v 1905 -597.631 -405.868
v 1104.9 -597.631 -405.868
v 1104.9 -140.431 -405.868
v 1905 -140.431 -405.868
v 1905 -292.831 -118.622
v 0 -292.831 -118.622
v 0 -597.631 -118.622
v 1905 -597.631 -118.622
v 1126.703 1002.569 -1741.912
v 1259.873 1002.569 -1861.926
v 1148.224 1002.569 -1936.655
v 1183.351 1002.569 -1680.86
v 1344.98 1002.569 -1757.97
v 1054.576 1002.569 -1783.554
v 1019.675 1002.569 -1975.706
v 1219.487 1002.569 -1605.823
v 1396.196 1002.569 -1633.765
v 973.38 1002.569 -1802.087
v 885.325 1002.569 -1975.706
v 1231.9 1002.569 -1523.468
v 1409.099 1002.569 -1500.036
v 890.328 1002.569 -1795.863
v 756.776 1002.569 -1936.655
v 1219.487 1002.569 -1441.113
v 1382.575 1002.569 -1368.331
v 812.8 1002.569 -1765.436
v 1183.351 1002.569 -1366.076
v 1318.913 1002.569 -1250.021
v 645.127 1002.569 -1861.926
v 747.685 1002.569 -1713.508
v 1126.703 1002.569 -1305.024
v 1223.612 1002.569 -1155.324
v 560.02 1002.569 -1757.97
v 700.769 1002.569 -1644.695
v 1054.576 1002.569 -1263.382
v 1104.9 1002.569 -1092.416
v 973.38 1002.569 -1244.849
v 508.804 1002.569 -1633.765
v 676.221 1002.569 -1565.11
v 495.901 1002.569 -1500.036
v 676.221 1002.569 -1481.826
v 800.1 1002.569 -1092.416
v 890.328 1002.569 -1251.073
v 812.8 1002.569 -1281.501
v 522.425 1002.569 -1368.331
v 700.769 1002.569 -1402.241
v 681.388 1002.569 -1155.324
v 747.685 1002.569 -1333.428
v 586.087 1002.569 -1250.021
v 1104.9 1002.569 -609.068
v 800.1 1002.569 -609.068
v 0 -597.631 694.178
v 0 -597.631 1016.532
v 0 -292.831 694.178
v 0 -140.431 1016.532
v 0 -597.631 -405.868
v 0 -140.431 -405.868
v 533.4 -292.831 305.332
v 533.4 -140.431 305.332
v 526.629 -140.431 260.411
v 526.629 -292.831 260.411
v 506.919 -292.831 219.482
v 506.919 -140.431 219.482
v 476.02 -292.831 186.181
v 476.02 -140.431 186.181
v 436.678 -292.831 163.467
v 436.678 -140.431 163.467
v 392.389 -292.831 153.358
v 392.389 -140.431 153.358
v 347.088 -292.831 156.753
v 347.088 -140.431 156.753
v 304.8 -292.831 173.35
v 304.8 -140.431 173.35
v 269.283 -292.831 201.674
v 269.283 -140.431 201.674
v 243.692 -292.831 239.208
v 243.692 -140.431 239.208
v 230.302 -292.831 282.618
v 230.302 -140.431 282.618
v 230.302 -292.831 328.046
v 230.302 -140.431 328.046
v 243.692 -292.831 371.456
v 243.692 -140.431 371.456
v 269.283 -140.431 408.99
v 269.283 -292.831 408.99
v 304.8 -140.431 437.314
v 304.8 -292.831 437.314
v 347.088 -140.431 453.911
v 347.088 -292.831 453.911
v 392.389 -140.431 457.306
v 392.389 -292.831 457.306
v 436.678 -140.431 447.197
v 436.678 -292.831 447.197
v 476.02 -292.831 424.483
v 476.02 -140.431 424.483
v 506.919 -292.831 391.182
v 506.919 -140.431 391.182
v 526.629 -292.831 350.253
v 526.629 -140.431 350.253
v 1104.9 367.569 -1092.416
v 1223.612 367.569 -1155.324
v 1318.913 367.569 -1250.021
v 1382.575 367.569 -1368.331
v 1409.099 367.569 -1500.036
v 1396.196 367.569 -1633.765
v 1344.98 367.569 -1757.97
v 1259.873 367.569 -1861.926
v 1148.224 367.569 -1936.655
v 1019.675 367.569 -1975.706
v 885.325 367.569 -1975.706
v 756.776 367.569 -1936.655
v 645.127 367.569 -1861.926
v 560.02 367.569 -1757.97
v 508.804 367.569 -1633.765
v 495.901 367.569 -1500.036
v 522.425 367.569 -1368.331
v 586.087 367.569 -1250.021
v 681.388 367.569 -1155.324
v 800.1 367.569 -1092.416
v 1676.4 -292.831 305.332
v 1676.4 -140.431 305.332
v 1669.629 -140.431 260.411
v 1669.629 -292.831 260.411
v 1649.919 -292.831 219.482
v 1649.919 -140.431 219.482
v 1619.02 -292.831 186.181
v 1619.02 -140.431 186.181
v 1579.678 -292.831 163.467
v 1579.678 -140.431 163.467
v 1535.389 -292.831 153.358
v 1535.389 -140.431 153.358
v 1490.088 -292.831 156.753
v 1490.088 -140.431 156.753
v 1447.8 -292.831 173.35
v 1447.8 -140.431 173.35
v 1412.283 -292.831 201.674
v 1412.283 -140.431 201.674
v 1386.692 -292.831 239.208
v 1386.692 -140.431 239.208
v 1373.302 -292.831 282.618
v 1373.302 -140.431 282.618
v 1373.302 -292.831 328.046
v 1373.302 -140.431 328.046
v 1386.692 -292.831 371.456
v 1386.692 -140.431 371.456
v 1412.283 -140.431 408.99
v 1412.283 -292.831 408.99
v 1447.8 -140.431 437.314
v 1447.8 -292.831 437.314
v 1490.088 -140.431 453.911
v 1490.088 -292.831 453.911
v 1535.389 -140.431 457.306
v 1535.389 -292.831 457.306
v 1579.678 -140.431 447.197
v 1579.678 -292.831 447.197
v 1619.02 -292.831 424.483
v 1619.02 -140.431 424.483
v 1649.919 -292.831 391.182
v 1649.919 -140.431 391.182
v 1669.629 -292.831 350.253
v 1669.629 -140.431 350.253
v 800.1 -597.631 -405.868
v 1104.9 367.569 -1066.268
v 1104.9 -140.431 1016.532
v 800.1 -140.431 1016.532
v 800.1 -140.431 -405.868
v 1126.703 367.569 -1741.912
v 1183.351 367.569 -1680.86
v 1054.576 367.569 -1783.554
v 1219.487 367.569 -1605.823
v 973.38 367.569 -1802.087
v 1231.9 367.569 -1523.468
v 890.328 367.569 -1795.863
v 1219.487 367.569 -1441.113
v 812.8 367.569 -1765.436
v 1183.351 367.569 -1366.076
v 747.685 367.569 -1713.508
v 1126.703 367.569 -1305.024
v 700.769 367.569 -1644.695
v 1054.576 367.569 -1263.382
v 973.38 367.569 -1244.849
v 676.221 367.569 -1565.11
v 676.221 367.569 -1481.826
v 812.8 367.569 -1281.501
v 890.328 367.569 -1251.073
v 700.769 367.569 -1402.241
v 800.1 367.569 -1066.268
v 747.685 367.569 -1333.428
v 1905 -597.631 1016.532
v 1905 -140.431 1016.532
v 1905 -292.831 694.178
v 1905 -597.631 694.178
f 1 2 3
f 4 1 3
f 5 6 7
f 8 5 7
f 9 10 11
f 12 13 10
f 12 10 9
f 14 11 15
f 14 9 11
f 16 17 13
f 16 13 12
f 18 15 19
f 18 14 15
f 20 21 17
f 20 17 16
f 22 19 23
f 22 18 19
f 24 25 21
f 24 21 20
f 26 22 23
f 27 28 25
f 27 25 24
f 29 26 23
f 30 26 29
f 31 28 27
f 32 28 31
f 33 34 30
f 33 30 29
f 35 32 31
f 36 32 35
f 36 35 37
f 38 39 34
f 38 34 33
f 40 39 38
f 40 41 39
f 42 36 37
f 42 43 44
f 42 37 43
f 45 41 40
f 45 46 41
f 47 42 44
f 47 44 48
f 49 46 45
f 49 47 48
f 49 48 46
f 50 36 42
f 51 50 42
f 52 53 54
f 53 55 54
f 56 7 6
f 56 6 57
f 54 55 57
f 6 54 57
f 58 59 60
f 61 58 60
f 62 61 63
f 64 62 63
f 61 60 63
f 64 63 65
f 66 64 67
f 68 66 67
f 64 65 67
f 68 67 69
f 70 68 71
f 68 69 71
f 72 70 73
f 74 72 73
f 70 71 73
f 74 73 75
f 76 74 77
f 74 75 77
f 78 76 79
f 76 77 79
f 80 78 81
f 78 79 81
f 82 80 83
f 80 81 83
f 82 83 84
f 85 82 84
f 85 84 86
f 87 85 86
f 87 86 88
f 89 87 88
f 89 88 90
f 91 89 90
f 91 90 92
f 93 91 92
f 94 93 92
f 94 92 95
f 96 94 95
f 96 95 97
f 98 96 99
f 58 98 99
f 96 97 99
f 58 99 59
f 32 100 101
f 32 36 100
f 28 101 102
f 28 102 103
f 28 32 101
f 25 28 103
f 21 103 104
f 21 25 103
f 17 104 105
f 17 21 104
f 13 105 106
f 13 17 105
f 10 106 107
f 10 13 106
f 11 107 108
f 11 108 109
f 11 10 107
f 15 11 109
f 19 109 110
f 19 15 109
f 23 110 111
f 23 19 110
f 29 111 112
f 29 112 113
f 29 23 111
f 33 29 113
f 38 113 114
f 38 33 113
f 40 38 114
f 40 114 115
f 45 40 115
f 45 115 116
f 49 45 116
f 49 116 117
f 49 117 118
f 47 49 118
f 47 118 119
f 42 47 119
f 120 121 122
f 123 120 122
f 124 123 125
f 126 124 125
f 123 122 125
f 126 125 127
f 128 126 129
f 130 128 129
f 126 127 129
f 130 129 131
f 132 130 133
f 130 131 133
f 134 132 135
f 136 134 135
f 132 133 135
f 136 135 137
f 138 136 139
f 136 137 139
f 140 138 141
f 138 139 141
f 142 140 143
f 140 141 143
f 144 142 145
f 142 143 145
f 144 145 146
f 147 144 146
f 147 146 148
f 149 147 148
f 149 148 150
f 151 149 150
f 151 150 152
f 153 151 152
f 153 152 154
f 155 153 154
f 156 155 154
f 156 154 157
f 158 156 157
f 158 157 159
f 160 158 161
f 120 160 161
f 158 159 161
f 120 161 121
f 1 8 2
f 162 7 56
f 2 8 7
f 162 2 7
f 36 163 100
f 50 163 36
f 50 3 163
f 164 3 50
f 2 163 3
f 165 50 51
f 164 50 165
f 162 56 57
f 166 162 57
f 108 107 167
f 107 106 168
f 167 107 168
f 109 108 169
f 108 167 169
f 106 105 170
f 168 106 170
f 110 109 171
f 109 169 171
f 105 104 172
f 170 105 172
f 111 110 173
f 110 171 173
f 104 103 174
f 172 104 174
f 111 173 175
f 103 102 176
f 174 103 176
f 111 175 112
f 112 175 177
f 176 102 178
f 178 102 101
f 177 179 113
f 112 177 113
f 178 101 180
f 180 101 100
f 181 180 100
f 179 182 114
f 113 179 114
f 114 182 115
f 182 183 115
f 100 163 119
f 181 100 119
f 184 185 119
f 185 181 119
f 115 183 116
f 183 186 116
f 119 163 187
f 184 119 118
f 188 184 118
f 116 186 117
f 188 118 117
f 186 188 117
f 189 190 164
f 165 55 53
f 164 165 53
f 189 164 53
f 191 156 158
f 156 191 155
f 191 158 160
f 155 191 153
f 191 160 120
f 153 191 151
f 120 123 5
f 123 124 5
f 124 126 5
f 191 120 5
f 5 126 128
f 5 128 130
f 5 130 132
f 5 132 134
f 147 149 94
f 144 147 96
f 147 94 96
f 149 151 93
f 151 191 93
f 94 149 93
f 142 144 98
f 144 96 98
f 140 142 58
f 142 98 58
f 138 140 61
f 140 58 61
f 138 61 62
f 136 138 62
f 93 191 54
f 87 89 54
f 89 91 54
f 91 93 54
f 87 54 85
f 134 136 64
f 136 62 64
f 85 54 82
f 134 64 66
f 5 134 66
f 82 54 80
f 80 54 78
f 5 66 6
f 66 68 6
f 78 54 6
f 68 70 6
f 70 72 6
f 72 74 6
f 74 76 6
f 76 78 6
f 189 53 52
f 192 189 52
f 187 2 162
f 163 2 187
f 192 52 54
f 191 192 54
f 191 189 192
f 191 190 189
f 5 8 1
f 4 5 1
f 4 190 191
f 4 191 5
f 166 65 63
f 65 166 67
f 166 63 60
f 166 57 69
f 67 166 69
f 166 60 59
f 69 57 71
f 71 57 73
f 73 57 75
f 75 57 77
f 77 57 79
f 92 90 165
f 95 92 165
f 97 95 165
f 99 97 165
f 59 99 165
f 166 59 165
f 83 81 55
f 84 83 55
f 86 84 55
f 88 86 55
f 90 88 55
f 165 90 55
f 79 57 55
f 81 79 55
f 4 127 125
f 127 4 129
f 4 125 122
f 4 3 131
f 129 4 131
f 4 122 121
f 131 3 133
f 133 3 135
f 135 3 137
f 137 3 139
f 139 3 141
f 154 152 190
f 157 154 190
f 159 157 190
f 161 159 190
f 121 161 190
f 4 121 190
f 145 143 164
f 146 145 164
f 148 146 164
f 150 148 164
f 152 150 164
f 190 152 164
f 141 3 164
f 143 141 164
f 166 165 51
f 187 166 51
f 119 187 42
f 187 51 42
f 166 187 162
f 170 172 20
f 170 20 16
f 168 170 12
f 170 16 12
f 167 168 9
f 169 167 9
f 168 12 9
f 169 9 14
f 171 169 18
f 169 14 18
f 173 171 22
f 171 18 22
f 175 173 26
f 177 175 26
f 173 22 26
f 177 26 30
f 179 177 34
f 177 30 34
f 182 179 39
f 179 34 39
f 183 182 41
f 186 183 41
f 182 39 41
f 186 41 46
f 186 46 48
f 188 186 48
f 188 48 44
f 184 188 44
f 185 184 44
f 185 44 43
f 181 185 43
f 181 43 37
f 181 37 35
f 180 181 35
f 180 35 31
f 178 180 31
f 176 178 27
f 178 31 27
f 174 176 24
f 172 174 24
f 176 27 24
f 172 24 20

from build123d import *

# Parameters (mm, degrees)
BOSS_EXTRUDE1_DEPTH      = 1905
SKETCH6_R                = 457.2
SKETCH6_R_2              = 279.4
BOSS_EXTRUDE2_DEPTH      = 635
BOSS_EXTRUDE3_DEPTH      = 152.4
BOSS_EXTRUDE3_DEPTH_BACK = 152.4
SKETCH11_R               = 152.4
CUT_EXTRUDE1_DEPTH       = 152.4
SKETCH12_W               = 304.8
SKETCH12_H               = 635
BOSS_EXTRUDE6_DEPTH      = 152.4


with BuildPart() as part:
    # Sketch1 → Boss-Extrude1 (new body)
    with BuildSketch(Plane(origin=(0, 0, 0), x_dir=(0, 0, -1), z_dir=(1, 0, 0))):
        Polygon((-1016.531937173, -597.631413613), (-694.178010471, -597.631413613), (-694.178010471, -292.831413613), (118.621989529, -292.831413613), (118.621989529, -597.631413613), (405.868062827, -597.631413613), (405.868062827, -140.431413613), (-1016.531937173, -140.431413613), align=None)
    extrude(amount=BOSS_EXTRUDE1_DEPTH)

    # Sketch10 → Boss-Extrude3 (add, two sides)
    with BuildSketch(Plane(origin=(952.5, 0, 0), x_dir=(0, 0, -1), z_dir=(1, 0, 0))) as boss_extrude3_sk:
        Polygon((609.068062827, 1002.568586387), (-1016.531937173, -140.431413613), (405.868062827, -140.431413613), (405.868062827, -597.631413613), (1066.268062827, 367.568586387), (1066.268062827, 1002.568586387), align=None)
    extrude(amount=BOSS_EXTRUDE3_DEPTH)
    extrude(boss_extrude3_sk.sketch, amount=-BOSS_EXTRUDE3_DEPTH_BACK)

    # Sketch11 → Cut-Extrude1 (cut)
    with BuildSketch(Plane(origin=(0, -140.431413613, 0), x_dir=(1, 0, 0), z_dir=(0, 1, 0))):
        with Locations((1524, -305.331937173)):
            Circle(SKETCH11_R)
        with Locations((381, -305.331937173)):
            Circle(SKETCH11_R)
    extrude(amount=-CUT_EXTRUDE1_DEPTH, mode=Mode.SUBTRACT)



with BuildPart() as body_2:
    # Sketch6 → Boss-Extrude2 (new body)
    with BuildSketch(Plane(origin=(0, 1002.568586387, 0), x_dir=(1, 0, 0), z_dir=(0, 1, 0))):
        with Locations((952.5, 1523.468062827)):
            Circle(SKETCH6_R)
        with Locations((952.5, 1523.468062827)):
            Circle(SKETCH6_R_2, mode=Mode.SUBTRACT)
    extrude(amount=-BOSS_EXTRUDE2_DEPTH)


with BuildPart() as part_1:
    add(part.part)

    add(body_2.part)  # Boss-Extrude6 merges body 2
    # Sketch12 → Boss-Extrude6 (add)
    with BuildSketch(Plane(origin=(0, 0, -1066.268062827), x_dir=(-1, 0, 0), z_dir=(0, 0, -1))):
        with Locations((-952.5, 685.068586387)):
            Rectangle(SKETCH12_W, SKETCH12_H)
    extrude(amount=BOSS_EXTRUDE6_DEPTH)


solid = part_1.part
